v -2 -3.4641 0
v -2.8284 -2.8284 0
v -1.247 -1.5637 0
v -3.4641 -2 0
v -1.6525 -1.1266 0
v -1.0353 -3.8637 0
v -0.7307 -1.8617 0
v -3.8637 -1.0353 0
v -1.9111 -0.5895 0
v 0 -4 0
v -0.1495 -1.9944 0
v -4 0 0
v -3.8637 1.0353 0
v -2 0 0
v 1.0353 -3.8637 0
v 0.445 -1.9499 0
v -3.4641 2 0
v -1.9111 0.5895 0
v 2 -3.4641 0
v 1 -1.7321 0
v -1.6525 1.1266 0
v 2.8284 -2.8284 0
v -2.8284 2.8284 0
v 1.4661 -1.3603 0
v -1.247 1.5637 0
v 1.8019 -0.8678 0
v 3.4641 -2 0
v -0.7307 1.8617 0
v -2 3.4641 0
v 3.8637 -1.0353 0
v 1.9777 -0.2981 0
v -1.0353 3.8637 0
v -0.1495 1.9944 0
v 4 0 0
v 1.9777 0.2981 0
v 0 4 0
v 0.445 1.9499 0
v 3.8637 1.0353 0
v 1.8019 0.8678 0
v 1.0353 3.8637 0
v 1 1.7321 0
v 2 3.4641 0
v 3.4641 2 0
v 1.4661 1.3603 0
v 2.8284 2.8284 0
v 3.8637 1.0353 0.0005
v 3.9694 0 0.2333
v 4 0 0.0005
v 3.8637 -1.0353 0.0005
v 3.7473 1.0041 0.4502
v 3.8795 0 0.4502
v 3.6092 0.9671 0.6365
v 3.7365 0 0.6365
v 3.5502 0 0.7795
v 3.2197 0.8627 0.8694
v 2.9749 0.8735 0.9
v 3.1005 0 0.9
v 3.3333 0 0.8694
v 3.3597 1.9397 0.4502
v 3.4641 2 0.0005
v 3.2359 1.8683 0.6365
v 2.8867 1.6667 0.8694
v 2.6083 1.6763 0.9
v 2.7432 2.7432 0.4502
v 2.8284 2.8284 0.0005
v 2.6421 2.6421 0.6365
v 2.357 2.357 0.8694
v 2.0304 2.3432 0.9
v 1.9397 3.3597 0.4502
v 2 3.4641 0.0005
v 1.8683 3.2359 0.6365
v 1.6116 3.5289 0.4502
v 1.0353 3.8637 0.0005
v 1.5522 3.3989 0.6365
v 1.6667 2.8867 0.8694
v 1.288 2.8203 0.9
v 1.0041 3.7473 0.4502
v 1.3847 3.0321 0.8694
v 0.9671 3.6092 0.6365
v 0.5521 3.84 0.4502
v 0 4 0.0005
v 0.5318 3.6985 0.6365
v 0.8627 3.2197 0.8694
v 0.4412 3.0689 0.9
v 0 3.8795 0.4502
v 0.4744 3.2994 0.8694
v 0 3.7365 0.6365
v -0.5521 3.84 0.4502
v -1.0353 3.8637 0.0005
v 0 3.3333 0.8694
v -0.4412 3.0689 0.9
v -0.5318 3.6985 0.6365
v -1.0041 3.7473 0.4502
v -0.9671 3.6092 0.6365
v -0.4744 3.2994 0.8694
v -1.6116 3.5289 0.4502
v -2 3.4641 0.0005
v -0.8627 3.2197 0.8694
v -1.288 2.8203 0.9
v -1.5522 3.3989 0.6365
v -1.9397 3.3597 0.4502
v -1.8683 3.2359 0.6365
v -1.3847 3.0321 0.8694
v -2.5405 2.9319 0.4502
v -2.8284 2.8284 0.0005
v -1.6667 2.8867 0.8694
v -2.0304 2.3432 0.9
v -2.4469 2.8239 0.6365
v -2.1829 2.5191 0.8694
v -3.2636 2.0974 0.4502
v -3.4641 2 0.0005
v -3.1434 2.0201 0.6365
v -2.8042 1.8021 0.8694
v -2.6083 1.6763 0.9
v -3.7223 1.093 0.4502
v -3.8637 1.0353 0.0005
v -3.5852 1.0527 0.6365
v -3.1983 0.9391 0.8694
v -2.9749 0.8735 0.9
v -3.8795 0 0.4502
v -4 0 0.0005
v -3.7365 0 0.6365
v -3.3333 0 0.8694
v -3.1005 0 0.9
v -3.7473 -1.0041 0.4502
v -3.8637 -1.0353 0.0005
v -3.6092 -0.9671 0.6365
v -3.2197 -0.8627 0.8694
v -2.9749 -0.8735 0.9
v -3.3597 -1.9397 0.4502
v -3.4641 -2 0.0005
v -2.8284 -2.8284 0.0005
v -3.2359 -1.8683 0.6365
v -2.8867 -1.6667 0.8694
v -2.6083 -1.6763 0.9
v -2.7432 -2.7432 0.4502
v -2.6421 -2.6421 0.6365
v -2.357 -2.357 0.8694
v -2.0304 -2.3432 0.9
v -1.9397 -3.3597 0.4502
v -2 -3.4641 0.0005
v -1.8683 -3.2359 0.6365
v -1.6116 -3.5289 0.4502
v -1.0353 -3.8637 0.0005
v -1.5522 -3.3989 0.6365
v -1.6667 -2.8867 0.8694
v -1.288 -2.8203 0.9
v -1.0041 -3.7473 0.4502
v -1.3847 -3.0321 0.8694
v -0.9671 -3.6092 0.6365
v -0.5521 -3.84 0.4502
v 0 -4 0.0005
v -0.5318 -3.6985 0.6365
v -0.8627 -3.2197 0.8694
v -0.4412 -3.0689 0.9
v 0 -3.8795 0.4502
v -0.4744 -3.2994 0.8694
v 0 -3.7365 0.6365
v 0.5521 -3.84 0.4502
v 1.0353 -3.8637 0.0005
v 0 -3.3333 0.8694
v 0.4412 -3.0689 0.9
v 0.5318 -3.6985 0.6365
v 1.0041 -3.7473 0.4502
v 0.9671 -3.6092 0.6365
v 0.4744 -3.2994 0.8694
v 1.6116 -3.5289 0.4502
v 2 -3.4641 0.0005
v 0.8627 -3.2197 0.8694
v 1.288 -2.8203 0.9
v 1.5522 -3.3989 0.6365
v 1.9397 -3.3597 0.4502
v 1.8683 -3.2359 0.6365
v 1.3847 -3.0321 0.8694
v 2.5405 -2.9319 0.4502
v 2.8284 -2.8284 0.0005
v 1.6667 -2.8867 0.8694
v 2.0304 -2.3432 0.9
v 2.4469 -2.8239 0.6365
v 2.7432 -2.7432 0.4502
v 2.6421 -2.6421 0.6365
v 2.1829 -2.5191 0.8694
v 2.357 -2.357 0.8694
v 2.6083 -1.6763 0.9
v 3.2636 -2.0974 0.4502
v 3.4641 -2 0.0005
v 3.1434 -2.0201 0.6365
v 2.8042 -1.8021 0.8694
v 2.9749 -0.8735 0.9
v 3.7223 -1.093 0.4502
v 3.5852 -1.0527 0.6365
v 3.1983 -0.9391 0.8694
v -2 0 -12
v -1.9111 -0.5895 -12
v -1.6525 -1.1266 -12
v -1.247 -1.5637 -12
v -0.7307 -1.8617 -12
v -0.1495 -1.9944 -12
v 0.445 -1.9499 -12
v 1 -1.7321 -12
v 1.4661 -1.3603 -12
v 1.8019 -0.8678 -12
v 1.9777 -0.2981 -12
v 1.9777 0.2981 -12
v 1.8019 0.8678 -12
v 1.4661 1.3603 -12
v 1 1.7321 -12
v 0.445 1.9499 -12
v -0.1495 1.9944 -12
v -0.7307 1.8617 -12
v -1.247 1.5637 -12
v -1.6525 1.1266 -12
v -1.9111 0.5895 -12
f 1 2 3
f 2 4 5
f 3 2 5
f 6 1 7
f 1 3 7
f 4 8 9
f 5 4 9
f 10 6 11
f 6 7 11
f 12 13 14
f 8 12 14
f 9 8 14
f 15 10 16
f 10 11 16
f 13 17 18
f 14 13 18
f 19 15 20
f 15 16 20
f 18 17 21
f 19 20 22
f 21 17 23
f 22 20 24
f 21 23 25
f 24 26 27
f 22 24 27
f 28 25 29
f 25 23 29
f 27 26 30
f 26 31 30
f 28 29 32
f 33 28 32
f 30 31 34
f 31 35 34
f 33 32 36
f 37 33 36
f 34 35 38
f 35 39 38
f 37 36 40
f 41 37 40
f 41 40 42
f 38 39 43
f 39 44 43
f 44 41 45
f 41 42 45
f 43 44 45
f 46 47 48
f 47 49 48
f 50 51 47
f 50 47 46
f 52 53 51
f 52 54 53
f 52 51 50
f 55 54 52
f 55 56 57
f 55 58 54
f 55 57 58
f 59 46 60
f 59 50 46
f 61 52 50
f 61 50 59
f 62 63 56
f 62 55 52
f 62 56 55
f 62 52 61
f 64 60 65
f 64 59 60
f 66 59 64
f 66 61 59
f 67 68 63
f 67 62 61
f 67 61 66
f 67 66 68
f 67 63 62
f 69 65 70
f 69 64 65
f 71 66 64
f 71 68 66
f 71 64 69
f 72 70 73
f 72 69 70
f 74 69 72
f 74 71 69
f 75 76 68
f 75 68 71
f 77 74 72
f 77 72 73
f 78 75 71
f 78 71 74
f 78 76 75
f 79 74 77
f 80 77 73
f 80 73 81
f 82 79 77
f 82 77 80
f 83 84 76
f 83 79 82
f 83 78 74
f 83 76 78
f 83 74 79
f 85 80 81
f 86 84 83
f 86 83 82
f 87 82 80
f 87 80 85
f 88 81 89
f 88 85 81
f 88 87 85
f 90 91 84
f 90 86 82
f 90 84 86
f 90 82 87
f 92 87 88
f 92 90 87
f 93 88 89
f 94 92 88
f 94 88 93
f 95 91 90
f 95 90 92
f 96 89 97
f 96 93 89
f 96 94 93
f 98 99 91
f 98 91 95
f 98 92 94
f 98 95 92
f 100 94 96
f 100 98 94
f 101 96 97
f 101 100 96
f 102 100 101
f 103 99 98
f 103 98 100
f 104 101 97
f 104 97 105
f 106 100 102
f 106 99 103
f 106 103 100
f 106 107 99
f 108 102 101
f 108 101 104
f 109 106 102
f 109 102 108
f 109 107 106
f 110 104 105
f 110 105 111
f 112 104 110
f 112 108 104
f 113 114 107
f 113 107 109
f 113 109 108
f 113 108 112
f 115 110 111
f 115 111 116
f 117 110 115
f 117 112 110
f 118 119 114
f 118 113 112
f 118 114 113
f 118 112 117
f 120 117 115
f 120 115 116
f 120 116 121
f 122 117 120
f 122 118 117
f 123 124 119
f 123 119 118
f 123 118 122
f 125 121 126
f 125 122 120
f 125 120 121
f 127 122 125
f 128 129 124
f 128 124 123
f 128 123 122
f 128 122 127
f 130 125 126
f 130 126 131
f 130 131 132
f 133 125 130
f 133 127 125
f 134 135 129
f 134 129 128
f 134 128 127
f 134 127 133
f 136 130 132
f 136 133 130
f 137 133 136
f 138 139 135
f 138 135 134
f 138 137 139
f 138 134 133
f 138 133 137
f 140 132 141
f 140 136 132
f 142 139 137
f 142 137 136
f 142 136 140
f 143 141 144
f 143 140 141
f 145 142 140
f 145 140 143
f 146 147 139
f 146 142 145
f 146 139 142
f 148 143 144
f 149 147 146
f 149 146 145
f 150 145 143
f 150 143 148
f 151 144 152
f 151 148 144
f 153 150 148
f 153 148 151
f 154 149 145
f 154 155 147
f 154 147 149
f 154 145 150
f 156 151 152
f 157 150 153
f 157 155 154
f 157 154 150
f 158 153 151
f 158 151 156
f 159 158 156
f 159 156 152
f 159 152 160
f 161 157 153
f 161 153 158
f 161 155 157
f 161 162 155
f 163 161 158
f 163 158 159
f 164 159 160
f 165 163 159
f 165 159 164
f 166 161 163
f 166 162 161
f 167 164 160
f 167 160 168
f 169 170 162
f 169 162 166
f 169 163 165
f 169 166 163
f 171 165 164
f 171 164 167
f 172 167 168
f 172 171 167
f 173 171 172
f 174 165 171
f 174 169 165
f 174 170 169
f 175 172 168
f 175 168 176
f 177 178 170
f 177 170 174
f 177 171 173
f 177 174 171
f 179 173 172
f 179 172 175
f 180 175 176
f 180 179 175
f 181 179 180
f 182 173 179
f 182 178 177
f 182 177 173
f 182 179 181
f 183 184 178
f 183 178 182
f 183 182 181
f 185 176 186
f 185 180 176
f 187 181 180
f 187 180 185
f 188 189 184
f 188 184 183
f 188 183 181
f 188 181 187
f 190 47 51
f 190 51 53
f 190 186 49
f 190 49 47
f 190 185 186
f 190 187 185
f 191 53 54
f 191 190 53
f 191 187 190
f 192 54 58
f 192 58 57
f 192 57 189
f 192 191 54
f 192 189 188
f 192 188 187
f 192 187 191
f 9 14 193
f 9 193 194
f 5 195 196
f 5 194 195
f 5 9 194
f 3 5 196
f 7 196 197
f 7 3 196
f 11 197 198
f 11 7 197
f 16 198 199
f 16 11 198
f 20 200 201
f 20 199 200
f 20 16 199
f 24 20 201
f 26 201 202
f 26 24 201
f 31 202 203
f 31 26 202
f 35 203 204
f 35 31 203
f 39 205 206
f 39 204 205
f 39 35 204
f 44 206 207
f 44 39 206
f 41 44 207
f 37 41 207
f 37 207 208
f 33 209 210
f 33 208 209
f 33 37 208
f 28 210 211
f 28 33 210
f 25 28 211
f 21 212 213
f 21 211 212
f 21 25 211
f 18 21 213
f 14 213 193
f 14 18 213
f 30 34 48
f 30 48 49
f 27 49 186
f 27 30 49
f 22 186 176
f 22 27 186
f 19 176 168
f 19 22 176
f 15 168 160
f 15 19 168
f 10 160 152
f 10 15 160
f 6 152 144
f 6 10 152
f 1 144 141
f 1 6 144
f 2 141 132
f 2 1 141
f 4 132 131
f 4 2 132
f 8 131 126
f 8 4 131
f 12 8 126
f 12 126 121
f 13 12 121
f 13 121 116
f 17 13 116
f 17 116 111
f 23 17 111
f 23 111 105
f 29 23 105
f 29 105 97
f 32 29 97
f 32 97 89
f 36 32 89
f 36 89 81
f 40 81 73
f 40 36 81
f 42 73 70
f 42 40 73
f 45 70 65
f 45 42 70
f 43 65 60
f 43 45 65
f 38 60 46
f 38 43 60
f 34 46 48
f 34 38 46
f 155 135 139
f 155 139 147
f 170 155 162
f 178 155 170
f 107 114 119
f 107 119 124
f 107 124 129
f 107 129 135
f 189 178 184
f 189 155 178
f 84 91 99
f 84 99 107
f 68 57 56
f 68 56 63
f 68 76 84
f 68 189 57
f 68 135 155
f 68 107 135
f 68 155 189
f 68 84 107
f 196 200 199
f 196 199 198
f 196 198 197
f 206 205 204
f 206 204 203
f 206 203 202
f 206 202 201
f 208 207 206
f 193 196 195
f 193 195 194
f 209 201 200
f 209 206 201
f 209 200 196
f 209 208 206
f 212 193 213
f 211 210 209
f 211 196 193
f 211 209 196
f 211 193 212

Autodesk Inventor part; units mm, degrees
ref_plane "YZ Plane" through (0, 0, 0) normal (1, 0, 0) x (0, 1, 0)
ref_plane "XZ Plane" through (0, 0, 0) normal (0, 1, 0) x (-1, 0, 0)
ref_plane "XY Plane" through (0, 0, 0) normal (0, 0, 1) x (1, 0, 0)
sketch "スケッチ1" plane through (0, 0, 0) normal (0, 0, 1) x (1, 0, 0)
  circle A0 centre (0, 0) radius 4
  dimension "d0" = 8
extrude "押し出し1" add sketch "スケッチ1" along normal blind 0.9
sketch "スケッチ2" plane through (0, 0, 0) normal (0, 0, -1) x (-1, 0, 0)
  circle A0 centre (0, 0) radius 2
  dimension "d3" = 4
extrude "押し出し2" add sketch "スケッチ2" along normal blind 12
thread "ねじ1" size "M4x0.7" class "6g" standard "ANSI Metric M Profile" full length
fillet "フィレット1" radius 0.9 1 edges at (-4, 0, 0.9)
properties part number "ネジ低頭m4.12" material "鋼、高強度、低合金"
